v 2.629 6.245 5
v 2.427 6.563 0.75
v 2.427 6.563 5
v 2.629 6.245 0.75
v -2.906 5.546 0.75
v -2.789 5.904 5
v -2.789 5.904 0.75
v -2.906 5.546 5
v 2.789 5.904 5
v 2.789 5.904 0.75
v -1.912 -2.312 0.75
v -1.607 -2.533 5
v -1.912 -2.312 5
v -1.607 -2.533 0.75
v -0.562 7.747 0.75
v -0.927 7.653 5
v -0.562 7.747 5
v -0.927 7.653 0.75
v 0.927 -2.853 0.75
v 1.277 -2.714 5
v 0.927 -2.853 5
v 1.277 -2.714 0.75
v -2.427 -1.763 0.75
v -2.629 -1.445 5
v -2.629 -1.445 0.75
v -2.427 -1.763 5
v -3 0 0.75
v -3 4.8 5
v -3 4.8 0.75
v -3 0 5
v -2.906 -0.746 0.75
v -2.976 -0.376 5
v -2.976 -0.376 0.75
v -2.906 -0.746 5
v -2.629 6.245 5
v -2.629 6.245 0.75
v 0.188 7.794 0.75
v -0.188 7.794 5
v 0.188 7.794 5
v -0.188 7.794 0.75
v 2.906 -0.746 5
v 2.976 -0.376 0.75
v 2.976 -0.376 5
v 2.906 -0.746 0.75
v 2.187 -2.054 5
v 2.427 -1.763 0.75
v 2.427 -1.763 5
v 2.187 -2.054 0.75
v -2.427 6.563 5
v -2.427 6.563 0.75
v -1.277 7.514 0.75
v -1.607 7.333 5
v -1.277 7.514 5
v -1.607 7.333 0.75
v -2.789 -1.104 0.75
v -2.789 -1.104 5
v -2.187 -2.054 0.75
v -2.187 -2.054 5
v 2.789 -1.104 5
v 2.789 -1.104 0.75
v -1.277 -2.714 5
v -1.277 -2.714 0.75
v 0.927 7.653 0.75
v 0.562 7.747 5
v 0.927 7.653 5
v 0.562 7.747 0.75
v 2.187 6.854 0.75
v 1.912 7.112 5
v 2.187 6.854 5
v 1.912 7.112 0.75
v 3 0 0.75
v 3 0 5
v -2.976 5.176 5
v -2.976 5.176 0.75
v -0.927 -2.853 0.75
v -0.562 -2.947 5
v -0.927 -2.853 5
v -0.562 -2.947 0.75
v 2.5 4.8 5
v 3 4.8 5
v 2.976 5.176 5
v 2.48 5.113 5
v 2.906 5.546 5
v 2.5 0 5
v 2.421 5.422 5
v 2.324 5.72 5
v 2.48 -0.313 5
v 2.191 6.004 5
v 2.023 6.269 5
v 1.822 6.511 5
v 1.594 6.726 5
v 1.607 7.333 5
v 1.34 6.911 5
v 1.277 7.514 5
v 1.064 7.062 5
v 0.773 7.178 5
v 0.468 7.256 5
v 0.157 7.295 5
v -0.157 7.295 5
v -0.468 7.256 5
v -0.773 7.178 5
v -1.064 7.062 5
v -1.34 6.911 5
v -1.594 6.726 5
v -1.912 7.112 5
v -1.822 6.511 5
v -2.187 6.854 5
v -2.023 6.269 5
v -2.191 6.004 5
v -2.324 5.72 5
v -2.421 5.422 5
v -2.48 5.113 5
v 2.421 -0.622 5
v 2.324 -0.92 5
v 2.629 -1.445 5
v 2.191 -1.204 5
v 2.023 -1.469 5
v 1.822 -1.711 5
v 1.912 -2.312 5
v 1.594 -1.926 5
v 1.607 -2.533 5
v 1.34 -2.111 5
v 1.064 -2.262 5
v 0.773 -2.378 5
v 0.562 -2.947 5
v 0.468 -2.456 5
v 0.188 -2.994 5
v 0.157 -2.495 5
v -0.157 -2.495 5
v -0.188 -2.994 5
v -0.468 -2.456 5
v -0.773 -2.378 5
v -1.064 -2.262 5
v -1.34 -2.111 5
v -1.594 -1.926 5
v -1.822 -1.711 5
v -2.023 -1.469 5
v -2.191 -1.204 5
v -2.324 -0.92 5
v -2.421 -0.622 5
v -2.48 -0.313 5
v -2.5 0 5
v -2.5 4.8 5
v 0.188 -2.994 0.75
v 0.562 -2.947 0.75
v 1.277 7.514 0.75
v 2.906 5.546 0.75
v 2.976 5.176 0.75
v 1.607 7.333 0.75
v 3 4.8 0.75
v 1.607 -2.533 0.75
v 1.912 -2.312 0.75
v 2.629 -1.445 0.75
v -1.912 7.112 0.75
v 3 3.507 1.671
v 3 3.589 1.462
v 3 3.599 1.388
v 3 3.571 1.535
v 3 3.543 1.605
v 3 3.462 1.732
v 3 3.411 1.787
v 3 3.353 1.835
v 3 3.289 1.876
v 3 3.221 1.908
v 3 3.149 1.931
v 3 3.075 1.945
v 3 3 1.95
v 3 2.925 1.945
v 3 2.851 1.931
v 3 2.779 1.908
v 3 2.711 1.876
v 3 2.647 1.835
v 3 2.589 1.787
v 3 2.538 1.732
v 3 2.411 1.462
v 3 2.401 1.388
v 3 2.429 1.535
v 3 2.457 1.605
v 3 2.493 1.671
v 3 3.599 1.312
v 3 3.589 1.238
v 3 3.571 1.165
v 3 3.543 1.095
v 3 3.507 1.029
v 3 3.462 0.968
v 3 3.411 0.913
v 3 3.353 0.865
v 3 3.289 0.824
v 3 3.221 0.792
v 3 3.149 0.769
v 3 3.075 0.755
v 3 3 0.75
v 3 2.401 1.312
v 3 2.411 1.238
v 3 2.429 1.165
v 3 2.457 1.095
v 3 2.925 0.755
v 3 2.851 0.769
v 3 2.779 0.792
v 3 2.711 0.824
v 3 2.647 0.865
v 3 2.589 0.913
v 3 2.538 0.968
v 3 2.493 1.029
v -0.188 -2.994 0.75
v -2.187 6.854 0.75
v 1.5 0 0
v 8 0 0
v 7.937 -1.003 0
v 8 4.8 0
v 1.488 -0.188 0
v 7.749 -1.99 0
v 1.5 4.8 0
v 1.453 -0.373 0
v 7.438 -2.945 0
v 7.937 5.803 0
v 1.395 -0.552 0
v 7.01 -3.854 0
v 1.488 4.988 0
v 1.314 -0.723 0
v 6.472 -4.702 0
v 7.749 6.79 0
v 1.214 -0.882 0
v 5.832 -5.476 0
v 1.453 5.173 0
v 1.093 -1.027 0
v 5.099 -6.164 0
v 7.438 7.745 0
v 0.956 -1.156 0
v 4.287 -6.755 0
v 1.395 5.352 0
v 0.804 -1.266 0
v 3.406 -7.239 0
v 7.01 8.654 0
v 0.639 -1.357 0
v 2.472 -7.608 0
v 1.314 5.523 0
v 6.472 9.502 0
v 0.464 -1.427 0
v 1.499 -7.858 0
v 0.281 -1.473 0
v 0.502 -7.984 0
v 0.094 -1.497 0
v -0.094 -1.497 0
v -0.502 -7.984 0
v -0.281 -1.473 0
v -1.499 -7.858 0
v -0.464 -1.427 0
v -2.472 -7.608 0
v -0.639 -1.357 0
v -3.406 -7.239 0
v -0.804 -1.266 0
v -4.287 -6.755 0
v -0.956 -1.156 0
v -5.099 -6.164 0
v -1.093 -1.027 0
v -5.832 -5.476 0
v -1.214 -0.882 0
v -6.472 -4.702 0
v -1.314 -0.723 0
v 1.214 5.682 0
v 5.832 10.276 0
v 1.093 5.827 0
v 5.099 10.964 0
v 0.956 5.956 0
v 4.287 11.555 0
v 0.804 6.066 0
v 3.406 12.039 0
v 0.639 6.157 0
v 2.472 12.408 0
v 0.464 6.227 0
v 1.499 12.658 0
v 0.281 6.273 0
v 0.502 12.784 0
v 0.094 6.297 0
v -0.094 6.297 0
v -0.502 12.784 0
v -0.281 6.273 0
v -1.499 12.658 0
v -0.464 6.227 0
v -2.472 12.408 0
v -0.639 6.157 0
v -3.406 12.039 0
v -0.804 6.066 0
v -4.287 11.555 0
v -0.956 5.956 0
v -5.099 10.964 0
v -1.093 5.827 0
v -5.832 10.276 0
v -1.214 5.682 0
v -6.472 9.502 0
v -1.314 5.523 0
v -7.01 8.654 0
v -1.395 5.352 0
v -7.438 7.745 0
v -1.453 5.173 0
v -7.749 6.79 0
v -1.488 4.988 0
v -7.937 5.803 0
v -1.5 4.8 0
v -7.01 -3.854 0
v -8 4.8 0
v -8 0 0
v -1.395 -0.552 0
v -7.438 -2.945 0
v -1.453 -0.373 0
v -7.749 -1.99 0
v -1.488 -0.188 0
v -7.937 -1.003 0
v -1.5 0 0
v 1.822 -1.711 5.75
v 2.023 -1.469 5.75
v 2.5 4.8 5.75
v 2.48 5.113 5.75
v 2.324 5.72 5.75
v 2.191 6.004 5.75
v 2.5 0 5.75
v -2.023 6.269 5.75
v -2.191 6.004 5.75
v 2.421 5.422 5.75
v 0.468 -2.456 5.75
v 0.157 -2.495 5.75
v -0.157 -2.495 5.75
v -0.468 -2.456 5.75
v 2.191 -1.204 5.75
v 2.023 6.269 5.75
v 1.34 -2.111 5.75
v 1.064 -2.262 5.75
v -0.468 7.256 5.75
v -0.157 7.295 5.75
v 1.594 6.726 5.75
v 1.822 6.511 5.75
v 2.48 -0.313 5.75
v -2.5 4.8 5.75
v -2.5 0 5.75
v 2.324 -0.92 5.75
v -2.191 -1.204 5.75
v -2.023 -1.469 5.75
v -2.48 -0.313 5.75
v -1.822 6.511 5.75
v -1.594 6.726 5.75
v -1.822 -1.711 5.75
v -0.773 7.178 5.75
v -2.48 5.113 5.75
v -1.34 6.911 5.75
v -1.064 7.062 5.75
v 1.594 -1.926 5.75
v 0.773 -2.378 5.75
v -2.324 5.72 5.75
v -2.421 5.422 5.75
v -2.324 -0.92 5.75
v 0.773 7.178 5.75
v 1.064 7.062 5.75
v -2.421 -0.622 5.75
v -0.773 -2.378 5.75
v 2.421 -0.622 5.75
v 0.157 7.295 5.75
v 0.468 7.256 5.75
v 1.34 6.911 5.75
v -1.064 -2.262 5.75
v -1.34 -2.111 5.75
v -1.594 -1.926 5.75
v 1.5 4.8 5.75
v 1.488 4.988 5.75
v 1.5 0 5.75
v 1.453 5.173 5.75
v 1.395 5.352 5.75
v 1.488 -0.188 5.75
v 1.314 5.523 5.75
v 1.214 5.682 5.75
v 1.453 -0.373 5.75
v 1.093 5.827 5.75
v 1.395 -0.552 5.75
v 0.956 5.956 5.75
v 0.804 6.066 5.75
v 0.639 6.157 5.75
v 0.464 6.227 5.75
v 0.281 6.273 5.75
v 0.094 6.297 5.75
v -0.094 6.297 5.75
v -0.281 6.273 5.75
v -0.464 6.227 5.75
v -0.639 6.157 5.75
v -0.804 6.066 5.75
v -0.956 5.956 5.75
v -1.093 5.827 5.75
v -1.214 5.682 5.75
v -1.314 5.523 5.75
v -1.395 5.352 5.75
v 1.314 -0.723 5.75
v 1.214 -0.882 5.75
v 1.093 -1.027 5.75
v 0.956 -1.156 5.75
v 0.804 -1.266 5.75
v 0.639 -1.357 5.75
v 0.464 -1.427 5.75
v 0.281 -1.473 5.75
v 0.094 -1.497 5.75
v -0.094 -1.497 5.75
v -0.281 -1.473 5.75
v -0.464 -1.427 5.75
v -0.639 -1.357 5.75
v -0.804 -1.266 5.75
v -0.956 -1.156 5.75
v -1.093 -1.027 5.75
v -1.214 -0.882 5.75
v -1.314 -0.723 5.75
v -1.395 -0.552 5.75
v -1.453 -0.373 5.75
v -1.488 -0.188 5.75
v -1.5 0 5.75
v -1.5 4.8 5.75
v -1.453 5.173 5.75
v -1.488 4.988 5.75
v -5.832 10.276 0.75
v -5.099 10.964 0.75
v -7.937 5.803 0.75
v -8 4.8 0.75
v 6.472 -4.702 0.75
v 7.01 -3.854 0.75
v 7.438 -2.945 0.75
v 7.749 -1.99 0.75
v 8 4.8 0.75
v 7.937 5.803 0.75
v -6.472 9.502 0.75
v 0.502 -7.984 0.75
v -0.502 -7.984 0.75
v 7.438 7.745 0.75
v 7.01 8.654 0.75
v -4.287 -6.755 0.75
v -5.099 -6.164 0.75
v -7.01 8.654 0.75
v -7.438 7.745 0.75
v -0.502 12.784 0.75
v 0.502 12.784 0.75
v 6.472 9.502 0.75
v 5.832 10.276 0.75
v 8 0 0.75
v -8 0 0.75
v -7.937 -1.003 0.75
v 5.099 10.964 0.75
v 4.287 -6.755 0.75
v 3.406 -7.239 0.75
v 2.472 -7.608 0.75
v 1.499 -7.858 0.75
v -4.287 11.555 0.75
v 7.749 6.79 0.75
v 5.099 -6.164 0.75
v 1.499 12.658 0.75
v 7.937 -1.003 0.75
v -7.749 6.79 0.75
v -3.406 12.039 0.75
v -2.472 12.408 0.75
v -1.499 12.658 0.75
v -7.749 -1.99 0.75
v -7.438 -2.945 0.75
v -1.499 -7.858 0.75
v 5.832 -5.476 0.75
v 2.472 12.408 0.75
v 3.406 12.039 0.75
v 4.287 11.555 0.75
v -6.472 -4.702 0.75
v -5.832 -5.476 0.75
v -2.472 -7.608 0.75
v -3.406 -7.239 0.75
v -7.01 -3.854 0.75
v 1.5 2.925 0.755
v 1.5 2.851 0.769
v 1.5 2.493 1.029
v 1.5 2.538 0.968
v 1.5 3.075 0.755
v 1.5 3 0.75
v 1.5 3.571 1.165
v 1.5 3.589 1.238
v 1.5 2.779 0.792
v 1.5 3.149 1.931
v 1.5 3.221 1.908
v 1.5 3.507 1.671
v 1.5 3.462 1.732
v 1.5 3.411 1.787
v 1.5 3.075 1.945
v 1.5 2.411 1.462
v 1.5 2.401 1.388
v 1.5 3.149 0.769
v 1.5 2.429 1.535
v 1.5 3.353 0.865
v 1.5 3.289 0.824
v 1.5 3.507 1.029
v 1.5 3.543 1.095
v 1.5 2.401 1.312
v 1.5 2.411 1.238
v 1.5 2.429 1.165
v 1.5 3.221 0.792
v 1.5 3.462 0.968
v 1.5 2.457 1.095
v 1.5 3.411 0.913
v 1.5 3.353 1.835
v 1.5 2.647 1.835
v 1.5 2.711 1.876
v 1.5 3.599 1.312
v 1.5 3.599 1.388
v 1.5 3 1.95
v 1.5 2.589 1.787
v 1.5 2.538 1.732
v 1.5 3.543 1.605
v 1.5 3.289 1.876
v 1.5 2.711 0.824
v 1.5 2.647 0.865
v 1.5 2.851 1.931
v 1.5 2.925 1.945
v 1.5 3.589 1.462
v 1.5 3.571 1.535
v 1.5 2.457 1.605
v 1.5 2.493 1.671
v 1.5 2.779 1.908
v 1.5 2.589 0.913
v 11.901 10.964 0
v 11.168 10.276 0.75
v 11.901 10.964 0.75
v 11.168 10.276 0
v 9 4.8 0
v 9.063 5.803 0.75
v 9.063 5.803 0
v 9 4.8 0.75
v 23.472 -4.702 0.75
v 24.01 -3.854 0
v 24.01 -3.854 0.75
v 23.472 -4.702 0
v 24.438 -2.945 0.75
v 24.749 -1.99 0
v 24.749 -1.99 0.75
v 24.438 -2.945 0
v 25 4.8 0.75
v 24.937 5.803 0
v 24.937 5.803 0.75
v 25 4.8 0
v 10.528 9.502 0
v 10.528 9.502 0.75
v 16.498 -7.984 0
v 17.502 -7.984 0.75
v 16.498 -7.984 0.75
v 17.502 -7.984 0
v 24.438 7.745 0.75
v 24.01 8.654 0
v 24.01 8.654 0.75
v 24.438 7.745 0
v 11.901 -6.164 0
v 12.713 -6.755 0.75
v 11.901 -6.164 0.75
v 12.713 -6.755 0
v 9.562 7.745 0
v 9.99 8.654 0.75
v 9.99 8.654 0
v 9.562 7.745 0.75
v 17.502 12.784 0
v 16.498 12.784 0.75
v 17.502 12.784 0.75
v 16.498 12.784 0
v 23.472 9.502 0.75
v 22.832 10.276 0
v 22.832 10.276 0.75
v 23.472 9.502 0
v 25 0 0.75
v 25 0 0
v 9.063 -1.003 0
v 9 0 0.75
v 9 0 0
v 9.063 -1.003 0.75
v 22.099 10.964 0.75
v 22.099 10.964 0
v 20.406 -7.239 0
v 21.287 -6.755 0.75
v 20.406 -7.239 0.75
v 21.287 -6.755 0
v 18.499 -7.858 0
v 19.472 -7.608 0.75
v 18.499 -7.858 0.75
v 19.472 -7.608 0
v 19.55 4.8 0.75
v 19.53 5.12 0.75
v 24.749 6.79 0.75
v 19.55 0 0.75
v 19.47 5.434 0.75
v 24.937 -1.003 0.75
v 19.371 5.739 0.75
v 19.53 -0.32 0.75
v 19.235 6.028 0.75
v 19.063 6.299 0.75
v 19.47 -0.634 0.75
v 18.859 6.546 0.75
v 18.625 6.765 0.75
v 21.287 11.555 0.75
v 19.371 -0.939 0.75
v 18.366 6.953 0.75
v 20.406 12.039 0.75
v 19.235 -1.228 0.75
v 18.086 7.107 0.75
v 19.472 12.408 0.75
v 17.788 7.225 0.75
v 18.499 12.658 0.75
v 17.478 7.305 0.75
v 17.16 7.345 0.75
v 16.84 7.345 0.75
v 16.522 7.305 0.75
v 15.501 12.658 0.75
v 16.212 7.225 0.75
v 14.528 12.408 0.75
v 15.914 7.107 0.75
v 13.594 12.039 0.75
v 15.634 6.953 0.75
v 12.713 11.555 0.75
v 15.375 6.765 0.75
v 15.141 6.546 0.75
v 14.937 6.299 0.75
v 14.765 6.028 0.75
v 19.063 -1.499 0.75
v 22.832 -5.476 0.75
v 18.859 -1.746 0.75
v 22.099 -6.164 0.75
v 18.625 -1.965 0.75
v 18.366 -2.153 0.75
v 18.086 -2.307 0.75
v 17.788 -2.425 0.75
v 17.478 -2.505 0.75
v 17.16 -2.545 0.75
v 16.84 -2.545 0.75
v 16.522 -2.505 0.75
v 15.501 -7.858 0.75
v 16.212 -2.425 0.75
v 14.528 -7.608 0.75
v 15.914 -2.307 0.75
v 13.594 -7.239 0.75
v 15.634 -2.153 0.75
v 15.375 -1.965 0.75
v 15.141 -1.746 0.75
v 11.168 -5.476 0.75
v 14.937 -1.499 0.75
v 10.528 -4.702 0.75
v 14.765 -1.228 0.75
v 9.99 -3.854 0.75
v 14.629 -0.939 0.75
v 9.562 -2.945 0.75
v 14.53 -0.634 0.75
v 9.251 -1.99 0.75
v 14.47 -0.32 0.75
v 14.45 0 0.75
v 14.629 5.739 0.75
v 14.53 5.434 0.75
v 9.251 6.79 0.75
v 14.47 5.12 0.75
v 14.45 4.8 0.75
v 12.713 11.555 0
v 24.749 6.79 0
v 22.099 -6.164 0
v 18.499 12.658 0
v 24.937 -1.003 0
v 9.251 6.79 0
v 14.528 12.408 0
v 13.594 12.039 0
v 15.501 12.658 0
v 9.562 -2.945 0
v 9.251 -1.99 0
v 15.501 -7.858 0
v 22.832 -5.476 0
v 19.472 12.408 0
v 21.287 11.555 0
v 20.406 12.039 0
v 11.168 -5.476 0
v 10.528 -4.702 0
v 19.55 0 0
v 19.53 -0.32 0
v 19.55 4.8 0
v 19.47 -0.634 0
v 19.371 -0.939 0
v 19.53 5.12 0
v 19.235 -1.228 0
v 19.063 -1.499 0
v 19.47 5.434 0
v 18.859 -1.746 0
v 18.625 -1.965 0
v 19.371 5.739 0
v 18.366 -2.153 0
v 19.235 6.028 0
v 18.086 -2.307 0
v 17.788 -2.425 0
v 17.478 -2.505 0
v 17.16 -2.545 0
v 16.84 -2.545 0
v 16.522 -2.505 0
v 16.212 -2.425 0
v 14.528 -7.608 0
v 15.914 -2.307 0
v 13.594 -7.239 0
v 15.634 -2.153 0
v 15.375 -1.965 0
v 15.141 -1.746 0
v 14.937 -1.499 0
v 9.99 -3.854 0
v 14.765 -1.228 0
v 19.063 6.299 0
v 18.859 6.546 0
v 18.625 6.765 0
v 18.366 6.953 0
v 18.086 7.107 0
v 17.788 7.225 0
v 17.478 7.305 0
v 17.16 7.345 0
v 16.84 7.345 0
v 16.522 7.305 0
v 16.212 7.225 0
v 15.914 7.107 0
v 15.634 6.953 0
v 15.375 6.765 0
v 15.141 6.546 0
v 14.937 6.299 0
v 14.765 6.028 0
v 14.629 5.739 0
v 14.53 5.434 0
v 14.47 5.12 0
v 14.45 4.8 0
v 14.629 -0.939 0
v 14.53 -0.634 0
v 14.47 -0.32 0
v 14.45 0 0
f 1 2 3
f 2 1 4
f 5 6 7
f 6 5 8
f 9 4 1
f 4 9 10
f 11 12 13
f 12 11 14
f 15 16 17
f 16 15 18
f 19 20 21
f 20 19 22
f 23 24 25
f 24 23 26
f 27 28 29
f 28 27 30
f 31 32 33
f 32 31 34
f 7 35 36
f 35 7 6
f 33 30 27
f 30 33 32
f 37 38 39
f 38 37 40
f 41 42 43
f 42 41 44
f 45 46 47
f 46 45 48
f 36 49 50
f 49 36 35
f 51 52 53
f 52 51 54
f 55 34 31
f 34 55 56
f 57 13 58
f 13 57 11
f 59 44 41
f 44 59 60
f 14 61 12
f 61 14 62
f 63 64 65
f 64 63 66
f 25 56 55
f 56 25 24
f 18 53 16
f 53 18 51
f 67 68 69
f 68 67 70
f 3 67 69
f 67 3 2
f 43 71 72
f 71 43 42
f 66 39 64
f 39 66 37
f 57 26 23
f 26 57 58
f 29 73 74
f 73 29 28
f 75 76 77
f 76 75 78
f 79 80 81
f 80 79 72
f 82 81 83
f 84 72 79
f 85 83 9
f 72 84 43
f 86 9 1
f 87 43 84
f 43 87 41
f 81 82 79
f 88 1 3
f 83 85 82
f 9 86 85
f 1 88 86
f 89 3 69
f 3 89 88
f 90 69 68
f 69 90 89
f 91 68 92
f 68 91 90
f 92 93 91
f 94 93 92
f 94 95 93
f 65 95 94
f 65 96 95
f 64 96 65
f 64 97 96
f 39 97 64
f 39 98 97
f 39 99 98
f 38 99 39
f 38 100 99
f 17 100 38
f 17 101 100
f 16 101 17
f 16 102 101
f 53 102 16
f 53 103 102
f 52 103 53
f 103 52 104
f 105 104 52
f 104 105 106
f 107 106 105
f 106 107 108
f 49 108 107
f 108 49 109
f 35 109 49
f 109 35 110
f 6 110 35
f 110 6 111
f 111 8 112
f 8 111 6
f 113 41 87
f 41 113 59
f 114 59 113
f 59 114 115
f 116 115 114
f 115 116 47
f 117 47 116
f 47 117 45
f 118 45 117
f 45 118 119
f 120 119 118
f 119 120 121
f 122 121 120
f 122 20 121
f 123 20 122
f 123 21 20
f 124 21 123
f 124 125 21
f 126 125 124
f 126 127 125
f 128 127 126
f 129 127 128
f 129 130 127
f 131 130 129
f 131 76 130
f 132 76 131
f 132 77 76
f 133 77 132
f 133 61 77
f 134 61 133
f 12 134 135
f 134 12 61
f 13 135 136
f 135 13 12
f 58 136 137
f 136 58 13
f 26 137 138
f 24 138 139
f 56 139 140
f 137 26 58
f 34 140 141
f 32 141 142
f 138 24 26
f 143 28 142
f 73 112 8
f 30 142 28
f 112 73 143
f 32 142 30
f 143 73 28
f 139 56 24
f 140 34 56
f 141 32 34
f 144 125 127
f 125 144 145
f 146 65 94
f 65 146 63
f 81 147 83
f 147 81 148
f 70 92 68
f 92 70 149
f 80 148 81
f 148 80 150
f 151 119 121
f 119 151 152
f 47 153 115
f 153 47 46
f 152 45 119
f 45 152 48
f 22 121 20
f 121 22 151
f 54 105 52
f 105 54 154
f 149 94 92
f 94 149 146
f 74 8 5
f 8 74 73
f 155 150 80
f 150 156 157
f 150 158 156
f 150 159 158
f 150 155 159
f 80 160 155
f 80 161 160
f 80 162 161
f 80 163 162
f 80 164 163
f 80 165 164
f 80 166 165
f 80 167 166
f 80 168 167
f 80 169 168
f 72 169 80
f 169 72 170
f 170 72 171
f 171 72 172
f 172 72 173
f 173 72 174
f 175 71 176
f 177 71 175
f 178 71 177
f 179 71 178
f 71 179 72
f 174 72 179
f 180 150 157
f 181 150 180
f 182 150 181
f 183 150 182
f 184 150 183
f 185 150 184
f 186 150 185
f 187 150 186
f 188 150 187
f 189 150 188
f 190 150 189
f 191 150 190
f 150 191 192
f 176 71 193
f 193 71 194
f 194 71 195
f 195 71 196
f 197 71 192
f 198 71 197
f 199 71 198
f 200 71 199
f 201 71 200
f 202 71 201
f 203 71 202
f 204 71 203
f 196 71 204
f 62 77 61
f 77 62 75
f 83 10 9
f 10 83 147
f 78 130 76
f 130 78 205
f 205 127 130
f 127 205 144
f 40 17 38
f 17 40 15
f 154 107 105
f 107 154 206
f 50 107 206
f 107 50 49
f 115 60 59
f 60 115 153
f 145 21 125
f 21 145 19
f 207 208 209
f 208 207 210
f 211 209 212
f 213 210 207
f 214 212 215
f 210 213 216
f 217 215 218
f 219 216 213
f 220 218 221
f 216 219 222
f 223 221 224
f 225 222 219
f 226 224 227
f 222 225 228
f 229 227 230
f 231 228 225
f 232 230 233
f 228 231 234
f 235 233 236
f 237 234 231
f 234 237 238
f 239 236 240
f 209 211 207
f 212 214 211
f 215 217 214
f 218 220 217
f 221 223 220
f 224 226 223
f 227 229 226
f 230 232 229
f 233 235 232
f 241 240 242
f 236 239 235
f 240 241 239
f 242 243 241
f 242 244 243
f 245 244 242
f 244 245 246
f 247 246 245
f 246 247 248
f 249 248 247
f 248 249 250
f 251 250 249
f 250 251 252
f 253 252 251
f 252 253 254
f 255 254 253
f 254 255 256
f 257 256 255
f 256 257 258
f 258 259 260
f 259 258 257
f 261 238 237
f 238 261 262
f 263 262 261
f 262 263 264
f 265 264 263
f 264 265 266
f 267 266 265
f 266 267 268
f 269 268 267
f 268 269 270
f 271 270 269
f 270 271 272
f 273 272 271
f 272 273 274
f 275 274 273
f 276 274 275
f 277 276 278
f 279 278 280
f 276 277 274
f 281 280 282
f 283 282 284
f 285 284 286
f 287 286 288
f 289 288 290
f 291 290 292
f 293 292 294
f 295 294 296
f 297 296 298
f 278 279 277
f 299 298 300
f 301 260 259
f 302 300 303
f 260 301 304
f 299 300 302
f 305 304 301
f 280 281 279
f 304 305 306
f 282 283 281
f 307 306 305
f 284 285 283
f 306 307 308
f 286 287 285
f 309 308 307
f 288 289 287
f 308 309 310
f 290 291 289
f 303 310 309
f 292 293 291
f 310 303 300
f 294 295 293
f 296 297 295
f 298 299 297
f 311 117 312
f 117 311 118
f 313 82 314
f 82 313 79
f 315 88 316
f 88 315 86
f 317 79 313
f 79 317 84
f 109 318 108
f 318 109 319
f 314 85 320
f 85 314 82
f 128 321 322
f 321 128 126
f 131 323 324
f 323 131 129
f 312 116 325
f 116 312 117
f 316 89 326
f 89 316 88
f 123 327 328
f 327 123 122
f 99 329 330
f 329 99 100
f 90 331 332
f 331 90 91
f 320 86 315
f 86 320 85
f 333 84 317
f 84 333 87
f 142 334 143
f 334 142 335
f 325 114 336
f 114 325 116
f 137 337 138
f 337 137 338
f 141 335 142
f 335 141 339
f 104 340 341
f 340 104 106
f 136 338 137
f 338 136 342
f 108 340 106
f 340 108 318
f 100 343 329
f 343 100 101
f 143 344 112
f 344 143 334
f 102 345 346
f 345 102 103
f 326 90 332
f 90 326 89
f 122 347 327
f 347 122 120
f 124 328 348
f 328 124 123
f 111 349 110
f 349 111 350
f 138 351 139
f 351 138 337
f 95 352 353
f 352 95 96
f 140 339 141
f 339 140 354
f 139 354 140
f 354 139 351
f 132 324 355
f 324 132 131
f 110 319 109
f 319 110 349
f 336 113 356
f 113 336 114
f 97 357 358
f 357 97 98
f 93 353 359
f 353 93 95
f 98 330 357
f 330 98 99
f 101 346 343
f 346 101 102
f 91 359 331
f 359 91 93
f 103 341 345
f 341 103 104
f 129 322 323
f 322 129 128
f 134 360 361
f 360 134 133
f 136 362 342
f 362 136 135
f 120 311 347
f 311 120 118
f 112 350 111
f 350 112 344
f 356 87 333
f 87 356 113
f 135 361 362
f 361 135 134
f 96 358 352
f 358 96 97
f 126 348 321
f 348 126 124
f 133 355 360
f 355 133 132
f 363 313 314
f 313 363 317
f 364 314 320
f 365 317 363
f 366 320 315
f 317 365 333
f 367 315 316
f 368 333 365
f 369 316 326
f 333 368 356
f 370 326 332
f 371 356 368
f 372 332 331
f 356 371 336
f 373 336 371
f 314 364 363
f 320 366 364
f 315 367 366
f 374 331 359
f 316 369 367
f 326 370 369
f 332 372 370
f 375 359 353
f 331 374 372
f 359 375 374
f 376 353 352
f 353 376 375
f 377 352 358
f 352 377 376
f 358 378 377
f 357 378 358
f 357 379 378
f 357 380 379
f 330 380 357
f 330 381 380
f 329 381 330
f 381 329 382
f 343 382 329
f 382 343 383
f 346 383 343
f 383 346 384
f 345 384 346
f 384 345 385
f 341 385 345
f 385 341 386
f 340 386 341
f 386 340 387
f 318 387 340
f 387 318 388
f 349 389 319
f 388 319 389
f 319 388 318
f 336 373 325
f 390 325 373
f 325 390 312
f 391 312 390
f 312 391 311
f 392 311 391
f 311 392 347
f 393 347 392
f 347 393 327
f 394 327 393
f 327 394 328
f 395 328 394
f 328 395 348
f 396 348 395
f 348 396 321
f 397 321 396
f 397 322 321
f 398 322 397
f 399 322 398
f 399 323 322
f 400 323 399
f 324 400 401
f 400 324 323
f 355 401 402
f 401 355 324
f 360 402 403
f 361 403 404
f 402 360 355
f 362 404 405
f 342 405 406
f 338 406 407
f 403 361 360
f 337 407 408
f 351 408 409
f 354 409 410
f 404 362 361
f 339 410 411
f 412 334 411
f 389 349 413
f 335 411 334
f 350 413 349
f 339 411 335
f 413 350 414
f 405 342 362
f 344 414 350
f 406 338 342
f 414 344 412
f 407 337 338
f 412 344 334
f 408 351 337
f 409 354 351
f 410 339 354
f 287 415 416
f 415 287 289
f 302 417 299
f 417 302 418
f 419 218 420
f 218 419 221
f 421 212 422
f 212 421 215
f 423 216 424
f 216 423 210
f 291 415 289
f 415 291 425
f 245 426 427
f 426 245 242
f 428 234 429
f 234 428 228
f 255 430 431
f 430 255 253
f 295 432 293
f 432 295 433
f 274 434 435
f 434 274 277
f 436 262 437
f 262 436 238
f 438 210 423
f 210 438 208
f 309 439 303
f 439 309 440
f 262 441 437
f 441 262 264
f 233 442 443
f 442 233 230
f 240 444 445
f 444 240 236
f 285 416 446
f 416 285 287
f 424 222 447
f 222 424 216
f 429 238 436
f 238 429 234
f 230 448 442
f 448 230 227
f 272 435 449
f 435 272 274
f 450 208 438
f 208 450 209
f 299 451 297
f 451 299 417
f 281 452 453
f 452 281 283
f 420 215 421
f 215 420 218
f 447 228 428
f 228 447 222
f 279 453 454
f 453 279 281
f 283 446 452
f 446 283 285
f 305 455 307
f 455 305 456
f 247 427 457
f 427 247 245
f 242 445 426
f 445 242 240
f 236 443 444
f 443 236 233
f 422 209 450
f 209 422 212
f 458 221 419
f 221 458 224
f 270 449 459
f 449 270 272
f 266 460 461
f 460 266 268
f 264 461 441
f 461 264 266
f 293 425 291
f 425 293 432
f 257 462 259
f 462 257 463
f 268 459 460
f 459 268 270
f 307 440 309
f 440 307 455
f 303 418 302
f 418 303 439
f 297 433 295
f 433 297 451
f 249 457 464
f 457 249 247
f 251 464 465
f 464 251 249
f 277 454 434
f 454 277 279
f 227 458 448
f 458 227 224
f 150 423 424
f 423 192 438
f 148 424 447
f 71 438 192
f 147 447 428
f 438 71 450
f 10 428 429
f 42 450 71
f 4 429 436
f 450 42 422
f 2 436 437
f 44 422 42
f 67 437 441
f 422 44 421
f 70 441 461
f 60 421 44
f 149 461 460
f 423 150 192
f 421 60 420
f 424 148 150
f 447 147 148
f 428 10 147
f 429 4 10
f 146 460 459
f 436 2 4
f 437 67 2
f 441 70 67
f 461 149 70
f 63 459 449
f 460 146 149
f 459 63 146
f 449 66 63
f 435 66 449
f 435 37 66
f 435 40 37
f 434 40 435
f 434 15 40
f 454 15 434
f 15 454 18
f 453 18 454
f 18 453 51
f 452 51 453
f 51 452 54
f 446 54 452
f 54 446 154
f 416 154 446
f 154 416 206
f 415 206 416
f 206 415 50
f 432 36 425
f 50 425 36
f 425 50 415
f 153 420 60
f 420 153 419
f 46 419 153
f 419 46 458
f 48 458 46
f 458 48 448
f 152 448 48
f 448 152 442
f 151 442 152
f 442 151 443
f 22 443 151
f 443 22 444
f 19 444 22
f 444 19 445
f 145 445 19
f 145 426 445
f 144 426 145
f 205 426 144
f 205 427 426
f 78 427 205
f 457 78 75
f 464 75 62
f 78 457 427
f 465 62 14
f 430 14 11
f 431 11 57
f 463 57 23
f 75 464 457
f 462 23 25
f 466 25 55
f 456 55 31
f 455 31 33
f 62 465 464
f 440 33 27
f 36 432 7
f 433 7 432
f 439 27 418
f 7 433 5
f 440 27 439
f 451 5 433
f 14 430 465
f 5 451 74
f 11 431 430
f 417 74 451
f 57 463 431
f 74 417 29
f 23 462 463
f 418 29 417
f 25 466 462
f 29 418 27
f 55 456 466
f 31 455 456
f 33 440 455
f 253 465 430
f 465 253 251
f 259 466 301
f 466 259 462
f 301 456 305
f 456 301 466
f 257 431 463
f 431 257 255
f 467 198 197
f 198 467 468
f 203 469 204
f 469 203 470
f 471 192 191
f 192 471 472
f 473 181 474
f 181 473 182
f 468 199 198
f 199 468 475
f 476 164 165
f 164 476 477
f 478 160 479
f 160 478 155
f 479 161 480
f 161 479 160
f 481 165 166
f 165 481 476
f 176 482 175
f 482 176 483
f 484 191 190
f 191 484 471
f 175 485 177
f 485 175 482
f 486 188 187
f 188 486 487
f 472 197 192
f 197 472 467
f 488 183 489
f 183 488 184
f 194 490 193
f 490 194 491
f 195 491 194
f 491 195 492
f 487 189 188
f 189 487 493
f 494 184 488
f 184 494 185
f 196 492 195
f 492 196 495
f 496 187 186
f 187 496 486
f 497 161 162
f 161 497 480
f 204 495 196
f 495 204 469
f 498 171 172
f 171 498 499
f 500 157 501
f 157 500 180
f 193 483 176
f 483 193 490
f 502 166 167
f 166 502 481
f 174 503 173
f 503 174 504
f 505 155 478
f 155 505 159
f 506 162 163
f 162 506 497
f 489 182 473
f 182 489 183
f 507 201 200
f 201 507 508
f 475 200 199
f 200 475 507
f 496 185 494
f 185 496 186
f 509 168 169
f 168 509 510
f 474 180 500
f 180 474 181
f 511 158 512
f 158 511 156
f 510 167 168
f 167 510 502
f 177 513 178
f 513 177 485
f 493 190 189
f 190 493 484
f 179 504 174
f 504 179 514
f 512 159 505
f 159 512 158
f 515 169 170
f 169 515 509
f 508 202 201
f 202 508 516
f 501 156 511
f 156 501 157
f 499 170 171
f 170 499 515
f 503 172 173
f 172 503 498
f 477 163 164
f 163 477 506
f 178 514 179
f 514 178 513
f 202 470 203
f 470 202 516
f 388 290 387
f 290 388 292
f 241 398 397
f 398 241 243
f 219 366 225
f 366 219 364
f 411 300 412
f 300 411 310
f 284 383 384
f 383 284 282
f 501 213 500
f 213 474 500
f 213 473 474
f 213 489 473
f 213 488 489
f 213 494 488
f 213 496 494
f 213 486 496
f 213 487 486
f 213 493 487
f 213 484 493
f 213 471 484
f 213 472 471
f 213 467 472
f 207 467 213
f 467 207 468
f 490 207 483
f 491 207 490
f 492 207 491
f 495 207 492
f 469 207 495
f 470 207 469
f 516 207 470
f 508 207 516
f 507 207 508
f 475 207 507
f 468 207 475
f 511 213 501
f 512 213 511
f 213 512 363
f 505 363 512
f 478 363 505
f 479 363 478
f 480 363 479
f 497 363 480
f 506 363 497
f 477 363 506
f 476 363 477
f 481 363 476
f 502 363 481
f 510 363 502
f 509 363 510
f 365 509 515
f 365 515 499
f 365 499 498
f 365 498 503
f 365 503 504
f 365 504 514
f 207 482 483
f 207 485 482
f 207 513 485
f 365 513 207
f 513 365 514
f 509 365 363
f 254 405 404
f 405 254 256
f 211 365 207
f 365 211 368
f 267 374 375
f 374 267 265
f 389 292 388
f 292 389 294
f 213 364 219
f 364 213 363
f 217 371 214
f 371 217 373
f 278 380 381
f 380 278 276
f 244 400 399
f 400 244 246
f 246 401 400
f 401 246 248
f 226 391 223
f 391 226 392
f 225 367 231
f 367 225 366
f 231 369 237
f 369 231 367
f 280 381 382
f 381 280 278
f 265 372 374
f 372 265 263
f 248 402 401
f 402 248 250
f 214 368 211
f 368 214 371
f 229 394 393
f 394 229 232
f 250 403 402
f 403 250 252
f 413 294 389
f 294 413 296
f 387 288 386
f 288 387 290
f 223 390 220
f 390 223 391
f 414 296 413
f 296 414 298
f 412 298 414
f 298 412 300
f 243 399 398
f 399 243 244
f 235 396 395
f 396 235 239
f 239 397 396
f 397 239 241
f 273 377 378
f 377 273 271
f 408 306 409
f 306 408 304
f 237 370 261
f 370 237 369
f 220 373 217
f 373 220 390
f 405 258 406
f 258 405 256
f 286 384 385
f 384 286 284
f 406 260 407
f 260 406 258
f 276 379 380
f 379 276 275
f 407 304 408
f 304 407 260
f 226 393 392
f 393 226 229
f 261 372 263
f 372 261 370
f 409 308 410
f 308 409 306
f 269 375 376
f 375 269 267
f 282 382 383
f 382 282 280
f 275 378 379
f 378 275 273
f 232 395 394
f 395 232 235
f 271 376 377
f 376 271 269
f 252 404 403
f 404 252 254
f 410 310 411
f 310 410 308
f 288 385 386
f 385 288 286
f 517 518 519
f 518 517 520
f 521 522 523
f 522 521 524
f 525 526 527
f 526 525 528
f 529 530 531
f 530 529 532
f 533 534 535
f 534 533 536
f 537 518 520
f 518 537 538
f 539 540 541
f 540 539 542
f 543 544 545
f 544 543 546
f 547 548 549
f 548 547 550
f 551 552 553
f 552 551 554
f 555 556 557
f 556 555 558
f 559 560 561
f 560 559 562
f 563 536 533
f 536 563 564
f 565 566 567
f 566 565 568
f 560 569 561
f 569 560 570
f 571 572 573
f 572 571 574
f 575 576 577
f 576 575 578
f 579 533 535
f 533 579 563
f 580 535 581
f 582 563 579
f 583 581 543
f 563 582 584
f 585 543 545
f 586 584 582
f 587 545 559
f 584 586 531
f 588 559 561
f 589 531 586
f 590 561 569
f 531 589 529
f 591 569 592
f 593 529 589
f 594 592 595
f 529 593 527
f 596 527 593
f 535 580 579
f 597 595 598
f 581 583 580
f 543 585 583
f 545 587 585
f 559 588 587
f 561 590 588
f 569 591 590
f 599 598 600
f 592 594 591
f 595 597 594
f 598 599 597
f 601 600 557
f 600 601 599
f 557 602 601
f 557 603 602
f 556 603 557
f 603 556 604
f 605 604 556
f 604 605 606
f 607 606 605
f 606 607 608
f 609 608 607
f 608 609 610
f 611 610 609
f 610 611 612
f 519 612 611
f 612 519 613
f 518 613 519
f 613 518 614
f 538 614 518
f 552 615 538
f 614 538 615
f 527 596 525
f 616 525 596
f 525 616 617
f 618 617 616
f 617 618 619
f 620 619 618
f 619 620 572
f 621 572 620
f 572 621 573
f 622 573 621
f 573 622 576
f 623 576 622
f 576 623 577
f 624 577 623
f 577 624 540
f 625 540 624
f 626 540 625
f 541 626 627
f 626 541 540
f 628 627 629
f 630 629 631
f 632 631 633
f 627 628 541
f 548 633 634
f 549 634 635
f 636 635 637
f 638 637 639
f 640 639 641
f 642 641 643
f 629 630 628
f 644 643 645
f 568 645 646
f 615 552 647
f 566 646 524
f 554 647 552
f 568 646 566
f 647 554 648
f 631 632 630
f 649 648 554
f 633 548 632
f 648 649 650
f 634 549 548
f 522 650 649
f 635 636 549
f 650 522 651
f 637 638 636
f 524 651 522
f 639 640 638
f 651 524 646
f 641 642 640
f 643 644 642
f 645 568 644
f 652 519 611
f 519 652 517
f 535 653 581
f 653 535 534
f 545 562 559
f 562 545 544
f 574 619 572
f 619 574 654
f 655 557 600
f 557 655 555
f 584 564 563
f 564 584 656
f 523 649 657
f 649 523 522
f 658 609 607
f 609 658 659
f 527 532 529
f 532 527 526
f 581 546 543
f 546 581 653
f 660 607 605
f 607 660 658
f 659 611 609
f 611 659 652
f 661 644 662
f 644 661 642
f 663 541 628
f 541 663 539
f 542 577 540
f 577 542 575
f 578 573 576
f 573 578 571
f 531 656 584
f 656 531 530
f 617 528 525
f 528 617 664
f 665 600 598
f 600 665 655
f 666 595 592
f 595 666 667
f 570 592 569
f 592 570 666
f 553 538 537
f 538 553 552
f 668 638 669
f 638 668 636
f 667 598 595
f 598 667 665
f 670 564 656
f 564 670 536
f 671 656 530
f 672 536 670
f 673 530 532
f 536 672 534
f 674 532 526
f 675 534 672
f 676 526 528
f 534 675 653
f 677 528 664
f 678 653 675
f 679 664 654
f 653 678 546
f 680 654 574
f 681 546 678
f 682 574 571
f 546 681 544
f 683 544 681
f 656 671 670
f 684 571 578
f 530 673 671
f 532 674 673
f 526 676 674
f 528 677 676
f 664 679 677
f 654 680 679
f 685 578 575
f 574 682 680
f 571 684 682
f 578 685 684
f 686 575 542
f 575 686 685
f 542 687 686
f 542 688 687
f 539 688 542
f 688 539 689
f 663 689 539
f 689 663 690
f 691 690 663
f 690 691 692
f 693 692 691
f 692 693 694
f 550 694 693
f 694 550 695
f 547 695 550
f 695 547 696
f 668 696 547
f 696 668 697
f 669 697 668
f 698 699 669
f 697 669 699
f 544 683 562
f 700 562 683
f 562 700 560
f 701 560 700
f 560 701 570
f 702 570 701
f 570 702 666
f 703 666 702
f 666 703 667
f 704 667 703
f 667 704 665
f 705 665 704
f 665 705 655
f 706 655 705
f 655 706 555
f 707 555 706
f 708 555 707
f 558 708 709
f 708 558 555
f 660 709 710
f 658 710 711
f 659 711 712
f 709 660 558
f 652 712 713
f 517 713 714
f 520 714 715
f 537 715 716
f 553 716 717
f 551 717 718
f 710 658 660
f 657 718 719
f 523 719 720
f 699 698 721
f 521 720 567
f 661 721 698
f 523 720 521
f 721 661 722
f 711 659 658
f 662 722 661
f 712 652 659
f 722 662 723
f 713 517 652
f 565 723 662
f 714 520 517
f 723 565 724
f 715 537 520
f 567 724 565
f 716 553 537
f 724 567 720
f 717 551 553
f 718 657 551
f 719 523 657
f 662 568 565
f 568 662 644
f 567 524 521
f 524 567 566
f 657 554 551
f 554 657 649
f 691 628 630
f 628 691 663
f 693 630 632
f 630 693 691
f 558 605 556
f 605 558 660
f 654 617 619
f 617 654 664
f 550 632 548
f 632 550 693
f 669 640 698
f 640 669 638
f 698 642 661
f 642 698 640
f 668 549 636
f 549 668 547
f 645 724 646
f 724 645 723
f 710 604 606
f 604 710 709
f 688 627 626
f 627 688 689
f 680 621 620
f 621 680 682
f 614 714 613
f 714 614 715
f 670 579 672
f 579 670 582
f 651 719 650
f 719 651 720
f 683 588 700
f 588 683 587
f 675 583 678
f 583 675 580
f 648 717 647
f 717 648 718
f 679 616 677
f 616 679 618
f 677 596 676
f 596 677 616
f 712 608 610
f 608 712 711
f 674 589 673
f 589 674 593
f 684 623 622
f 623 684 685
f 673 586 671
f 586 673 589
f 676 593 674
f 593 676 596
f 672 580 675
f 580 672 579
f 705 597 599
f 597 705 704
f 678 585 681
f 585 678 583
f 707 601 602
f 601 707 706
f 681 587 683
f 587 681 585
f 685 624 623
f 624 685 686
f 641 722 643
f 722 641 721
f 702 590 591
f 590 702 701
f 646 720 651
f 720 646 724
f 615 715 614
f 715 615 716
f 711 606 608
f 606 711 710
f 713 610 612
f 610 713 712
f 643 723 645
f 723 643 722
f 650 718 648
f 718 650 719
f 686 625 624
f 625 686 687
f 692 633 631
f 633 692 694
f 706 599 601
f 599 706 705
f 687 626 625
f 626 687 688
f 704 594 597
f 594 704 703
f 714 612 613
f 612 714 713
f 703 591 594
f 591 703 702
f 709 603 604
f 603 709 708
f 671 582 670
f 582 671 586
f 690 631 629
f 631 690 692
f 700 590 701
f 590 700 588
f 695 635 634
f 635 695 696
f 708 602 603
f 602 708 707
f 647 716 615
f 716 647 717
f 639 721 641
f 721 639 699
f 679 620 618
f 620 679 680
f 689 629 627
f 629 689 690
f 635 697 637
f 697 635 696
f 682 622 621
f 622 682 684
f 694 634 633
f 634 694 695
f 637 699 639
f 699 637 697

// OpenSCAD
//coil
//Andrey Kostin 2016

hc =5;//coil height
dc = 6; //inner diameter
do = 16; //external diameter
dp = 1.2; //hole diameter

//hole location
sel = 1; //0 - down, 1 - side hole

rc = dc/2;
ro = do/2;
rp = dp/2;

difference(){
    union(){
hull(){
    cylinder(h=hc,r1=rc,r2=rc,$fn =50,center = false);
translate([0, rc*1.6, 0])cylinder(h=hc,r1=rc,r2=rc,$fn =50,center = false);
}

translate([0, 0, hc])hull(){
    cylinder(h=0.75,r1=rc-0.5,r2=rc-0.5,$fn =50,center = false);
translate([0, rc*1.6, 0])cylinder(h=0.75,r1=rc-0.5,r2=rc-0.5,$fn =50,center = false);
}
hull(){
    cylinder(h=0.75,r1=ro,r2=ro,$fn =50,center = false);
translate([0, rc*1.6, 0])cylinder(h=0.75,r1=ro,r2=ro,$fn =50,center = false);
}}
union(){
    //
 if(sel == 0)translate([rc+0.6, 2, -1])cylinder(h=10,r1=rp,r2=rp,$fn =50,center = false);

   //
    if(sel == 1)rotate(a=[0,90,0])translate([-(0.75+rp), rc, 0])cylinder(h=dc,r1=rp,r2=rp,$fn =50,center = false);    
    
   
  translate([0, 0, -1])hull(){
    cylinder(h=9,r1=1.5,r2=1.5,$fn =50,center = false);
translate([0, rc*1.6, 0])cylinder(h=9,r1=1.5,r2=1.5,$fn =50,center = false);
 
} }  
}

//hoop
translate([do+1, 0, 0])difference(){
  hull(){
    cylinder(h=0.75,r1=ro,r2=ro,$fn =50,center = false);
translate([0, rc*1.6, 0])cylinder(h=0.75,r1=ro,r2=ro,$fn =50,center = false);}  
    
translate([0, 0, -2])hull(){
    cylinder(h=6,r1=rc-0.45,r2=rc-0.45,$fn =50,center = false);
translate([0, rc*1.6, 0])cylinder(h=6,r1=rc-0.45,r2=rc-0.45,$fn =50,center = false);
}

}
